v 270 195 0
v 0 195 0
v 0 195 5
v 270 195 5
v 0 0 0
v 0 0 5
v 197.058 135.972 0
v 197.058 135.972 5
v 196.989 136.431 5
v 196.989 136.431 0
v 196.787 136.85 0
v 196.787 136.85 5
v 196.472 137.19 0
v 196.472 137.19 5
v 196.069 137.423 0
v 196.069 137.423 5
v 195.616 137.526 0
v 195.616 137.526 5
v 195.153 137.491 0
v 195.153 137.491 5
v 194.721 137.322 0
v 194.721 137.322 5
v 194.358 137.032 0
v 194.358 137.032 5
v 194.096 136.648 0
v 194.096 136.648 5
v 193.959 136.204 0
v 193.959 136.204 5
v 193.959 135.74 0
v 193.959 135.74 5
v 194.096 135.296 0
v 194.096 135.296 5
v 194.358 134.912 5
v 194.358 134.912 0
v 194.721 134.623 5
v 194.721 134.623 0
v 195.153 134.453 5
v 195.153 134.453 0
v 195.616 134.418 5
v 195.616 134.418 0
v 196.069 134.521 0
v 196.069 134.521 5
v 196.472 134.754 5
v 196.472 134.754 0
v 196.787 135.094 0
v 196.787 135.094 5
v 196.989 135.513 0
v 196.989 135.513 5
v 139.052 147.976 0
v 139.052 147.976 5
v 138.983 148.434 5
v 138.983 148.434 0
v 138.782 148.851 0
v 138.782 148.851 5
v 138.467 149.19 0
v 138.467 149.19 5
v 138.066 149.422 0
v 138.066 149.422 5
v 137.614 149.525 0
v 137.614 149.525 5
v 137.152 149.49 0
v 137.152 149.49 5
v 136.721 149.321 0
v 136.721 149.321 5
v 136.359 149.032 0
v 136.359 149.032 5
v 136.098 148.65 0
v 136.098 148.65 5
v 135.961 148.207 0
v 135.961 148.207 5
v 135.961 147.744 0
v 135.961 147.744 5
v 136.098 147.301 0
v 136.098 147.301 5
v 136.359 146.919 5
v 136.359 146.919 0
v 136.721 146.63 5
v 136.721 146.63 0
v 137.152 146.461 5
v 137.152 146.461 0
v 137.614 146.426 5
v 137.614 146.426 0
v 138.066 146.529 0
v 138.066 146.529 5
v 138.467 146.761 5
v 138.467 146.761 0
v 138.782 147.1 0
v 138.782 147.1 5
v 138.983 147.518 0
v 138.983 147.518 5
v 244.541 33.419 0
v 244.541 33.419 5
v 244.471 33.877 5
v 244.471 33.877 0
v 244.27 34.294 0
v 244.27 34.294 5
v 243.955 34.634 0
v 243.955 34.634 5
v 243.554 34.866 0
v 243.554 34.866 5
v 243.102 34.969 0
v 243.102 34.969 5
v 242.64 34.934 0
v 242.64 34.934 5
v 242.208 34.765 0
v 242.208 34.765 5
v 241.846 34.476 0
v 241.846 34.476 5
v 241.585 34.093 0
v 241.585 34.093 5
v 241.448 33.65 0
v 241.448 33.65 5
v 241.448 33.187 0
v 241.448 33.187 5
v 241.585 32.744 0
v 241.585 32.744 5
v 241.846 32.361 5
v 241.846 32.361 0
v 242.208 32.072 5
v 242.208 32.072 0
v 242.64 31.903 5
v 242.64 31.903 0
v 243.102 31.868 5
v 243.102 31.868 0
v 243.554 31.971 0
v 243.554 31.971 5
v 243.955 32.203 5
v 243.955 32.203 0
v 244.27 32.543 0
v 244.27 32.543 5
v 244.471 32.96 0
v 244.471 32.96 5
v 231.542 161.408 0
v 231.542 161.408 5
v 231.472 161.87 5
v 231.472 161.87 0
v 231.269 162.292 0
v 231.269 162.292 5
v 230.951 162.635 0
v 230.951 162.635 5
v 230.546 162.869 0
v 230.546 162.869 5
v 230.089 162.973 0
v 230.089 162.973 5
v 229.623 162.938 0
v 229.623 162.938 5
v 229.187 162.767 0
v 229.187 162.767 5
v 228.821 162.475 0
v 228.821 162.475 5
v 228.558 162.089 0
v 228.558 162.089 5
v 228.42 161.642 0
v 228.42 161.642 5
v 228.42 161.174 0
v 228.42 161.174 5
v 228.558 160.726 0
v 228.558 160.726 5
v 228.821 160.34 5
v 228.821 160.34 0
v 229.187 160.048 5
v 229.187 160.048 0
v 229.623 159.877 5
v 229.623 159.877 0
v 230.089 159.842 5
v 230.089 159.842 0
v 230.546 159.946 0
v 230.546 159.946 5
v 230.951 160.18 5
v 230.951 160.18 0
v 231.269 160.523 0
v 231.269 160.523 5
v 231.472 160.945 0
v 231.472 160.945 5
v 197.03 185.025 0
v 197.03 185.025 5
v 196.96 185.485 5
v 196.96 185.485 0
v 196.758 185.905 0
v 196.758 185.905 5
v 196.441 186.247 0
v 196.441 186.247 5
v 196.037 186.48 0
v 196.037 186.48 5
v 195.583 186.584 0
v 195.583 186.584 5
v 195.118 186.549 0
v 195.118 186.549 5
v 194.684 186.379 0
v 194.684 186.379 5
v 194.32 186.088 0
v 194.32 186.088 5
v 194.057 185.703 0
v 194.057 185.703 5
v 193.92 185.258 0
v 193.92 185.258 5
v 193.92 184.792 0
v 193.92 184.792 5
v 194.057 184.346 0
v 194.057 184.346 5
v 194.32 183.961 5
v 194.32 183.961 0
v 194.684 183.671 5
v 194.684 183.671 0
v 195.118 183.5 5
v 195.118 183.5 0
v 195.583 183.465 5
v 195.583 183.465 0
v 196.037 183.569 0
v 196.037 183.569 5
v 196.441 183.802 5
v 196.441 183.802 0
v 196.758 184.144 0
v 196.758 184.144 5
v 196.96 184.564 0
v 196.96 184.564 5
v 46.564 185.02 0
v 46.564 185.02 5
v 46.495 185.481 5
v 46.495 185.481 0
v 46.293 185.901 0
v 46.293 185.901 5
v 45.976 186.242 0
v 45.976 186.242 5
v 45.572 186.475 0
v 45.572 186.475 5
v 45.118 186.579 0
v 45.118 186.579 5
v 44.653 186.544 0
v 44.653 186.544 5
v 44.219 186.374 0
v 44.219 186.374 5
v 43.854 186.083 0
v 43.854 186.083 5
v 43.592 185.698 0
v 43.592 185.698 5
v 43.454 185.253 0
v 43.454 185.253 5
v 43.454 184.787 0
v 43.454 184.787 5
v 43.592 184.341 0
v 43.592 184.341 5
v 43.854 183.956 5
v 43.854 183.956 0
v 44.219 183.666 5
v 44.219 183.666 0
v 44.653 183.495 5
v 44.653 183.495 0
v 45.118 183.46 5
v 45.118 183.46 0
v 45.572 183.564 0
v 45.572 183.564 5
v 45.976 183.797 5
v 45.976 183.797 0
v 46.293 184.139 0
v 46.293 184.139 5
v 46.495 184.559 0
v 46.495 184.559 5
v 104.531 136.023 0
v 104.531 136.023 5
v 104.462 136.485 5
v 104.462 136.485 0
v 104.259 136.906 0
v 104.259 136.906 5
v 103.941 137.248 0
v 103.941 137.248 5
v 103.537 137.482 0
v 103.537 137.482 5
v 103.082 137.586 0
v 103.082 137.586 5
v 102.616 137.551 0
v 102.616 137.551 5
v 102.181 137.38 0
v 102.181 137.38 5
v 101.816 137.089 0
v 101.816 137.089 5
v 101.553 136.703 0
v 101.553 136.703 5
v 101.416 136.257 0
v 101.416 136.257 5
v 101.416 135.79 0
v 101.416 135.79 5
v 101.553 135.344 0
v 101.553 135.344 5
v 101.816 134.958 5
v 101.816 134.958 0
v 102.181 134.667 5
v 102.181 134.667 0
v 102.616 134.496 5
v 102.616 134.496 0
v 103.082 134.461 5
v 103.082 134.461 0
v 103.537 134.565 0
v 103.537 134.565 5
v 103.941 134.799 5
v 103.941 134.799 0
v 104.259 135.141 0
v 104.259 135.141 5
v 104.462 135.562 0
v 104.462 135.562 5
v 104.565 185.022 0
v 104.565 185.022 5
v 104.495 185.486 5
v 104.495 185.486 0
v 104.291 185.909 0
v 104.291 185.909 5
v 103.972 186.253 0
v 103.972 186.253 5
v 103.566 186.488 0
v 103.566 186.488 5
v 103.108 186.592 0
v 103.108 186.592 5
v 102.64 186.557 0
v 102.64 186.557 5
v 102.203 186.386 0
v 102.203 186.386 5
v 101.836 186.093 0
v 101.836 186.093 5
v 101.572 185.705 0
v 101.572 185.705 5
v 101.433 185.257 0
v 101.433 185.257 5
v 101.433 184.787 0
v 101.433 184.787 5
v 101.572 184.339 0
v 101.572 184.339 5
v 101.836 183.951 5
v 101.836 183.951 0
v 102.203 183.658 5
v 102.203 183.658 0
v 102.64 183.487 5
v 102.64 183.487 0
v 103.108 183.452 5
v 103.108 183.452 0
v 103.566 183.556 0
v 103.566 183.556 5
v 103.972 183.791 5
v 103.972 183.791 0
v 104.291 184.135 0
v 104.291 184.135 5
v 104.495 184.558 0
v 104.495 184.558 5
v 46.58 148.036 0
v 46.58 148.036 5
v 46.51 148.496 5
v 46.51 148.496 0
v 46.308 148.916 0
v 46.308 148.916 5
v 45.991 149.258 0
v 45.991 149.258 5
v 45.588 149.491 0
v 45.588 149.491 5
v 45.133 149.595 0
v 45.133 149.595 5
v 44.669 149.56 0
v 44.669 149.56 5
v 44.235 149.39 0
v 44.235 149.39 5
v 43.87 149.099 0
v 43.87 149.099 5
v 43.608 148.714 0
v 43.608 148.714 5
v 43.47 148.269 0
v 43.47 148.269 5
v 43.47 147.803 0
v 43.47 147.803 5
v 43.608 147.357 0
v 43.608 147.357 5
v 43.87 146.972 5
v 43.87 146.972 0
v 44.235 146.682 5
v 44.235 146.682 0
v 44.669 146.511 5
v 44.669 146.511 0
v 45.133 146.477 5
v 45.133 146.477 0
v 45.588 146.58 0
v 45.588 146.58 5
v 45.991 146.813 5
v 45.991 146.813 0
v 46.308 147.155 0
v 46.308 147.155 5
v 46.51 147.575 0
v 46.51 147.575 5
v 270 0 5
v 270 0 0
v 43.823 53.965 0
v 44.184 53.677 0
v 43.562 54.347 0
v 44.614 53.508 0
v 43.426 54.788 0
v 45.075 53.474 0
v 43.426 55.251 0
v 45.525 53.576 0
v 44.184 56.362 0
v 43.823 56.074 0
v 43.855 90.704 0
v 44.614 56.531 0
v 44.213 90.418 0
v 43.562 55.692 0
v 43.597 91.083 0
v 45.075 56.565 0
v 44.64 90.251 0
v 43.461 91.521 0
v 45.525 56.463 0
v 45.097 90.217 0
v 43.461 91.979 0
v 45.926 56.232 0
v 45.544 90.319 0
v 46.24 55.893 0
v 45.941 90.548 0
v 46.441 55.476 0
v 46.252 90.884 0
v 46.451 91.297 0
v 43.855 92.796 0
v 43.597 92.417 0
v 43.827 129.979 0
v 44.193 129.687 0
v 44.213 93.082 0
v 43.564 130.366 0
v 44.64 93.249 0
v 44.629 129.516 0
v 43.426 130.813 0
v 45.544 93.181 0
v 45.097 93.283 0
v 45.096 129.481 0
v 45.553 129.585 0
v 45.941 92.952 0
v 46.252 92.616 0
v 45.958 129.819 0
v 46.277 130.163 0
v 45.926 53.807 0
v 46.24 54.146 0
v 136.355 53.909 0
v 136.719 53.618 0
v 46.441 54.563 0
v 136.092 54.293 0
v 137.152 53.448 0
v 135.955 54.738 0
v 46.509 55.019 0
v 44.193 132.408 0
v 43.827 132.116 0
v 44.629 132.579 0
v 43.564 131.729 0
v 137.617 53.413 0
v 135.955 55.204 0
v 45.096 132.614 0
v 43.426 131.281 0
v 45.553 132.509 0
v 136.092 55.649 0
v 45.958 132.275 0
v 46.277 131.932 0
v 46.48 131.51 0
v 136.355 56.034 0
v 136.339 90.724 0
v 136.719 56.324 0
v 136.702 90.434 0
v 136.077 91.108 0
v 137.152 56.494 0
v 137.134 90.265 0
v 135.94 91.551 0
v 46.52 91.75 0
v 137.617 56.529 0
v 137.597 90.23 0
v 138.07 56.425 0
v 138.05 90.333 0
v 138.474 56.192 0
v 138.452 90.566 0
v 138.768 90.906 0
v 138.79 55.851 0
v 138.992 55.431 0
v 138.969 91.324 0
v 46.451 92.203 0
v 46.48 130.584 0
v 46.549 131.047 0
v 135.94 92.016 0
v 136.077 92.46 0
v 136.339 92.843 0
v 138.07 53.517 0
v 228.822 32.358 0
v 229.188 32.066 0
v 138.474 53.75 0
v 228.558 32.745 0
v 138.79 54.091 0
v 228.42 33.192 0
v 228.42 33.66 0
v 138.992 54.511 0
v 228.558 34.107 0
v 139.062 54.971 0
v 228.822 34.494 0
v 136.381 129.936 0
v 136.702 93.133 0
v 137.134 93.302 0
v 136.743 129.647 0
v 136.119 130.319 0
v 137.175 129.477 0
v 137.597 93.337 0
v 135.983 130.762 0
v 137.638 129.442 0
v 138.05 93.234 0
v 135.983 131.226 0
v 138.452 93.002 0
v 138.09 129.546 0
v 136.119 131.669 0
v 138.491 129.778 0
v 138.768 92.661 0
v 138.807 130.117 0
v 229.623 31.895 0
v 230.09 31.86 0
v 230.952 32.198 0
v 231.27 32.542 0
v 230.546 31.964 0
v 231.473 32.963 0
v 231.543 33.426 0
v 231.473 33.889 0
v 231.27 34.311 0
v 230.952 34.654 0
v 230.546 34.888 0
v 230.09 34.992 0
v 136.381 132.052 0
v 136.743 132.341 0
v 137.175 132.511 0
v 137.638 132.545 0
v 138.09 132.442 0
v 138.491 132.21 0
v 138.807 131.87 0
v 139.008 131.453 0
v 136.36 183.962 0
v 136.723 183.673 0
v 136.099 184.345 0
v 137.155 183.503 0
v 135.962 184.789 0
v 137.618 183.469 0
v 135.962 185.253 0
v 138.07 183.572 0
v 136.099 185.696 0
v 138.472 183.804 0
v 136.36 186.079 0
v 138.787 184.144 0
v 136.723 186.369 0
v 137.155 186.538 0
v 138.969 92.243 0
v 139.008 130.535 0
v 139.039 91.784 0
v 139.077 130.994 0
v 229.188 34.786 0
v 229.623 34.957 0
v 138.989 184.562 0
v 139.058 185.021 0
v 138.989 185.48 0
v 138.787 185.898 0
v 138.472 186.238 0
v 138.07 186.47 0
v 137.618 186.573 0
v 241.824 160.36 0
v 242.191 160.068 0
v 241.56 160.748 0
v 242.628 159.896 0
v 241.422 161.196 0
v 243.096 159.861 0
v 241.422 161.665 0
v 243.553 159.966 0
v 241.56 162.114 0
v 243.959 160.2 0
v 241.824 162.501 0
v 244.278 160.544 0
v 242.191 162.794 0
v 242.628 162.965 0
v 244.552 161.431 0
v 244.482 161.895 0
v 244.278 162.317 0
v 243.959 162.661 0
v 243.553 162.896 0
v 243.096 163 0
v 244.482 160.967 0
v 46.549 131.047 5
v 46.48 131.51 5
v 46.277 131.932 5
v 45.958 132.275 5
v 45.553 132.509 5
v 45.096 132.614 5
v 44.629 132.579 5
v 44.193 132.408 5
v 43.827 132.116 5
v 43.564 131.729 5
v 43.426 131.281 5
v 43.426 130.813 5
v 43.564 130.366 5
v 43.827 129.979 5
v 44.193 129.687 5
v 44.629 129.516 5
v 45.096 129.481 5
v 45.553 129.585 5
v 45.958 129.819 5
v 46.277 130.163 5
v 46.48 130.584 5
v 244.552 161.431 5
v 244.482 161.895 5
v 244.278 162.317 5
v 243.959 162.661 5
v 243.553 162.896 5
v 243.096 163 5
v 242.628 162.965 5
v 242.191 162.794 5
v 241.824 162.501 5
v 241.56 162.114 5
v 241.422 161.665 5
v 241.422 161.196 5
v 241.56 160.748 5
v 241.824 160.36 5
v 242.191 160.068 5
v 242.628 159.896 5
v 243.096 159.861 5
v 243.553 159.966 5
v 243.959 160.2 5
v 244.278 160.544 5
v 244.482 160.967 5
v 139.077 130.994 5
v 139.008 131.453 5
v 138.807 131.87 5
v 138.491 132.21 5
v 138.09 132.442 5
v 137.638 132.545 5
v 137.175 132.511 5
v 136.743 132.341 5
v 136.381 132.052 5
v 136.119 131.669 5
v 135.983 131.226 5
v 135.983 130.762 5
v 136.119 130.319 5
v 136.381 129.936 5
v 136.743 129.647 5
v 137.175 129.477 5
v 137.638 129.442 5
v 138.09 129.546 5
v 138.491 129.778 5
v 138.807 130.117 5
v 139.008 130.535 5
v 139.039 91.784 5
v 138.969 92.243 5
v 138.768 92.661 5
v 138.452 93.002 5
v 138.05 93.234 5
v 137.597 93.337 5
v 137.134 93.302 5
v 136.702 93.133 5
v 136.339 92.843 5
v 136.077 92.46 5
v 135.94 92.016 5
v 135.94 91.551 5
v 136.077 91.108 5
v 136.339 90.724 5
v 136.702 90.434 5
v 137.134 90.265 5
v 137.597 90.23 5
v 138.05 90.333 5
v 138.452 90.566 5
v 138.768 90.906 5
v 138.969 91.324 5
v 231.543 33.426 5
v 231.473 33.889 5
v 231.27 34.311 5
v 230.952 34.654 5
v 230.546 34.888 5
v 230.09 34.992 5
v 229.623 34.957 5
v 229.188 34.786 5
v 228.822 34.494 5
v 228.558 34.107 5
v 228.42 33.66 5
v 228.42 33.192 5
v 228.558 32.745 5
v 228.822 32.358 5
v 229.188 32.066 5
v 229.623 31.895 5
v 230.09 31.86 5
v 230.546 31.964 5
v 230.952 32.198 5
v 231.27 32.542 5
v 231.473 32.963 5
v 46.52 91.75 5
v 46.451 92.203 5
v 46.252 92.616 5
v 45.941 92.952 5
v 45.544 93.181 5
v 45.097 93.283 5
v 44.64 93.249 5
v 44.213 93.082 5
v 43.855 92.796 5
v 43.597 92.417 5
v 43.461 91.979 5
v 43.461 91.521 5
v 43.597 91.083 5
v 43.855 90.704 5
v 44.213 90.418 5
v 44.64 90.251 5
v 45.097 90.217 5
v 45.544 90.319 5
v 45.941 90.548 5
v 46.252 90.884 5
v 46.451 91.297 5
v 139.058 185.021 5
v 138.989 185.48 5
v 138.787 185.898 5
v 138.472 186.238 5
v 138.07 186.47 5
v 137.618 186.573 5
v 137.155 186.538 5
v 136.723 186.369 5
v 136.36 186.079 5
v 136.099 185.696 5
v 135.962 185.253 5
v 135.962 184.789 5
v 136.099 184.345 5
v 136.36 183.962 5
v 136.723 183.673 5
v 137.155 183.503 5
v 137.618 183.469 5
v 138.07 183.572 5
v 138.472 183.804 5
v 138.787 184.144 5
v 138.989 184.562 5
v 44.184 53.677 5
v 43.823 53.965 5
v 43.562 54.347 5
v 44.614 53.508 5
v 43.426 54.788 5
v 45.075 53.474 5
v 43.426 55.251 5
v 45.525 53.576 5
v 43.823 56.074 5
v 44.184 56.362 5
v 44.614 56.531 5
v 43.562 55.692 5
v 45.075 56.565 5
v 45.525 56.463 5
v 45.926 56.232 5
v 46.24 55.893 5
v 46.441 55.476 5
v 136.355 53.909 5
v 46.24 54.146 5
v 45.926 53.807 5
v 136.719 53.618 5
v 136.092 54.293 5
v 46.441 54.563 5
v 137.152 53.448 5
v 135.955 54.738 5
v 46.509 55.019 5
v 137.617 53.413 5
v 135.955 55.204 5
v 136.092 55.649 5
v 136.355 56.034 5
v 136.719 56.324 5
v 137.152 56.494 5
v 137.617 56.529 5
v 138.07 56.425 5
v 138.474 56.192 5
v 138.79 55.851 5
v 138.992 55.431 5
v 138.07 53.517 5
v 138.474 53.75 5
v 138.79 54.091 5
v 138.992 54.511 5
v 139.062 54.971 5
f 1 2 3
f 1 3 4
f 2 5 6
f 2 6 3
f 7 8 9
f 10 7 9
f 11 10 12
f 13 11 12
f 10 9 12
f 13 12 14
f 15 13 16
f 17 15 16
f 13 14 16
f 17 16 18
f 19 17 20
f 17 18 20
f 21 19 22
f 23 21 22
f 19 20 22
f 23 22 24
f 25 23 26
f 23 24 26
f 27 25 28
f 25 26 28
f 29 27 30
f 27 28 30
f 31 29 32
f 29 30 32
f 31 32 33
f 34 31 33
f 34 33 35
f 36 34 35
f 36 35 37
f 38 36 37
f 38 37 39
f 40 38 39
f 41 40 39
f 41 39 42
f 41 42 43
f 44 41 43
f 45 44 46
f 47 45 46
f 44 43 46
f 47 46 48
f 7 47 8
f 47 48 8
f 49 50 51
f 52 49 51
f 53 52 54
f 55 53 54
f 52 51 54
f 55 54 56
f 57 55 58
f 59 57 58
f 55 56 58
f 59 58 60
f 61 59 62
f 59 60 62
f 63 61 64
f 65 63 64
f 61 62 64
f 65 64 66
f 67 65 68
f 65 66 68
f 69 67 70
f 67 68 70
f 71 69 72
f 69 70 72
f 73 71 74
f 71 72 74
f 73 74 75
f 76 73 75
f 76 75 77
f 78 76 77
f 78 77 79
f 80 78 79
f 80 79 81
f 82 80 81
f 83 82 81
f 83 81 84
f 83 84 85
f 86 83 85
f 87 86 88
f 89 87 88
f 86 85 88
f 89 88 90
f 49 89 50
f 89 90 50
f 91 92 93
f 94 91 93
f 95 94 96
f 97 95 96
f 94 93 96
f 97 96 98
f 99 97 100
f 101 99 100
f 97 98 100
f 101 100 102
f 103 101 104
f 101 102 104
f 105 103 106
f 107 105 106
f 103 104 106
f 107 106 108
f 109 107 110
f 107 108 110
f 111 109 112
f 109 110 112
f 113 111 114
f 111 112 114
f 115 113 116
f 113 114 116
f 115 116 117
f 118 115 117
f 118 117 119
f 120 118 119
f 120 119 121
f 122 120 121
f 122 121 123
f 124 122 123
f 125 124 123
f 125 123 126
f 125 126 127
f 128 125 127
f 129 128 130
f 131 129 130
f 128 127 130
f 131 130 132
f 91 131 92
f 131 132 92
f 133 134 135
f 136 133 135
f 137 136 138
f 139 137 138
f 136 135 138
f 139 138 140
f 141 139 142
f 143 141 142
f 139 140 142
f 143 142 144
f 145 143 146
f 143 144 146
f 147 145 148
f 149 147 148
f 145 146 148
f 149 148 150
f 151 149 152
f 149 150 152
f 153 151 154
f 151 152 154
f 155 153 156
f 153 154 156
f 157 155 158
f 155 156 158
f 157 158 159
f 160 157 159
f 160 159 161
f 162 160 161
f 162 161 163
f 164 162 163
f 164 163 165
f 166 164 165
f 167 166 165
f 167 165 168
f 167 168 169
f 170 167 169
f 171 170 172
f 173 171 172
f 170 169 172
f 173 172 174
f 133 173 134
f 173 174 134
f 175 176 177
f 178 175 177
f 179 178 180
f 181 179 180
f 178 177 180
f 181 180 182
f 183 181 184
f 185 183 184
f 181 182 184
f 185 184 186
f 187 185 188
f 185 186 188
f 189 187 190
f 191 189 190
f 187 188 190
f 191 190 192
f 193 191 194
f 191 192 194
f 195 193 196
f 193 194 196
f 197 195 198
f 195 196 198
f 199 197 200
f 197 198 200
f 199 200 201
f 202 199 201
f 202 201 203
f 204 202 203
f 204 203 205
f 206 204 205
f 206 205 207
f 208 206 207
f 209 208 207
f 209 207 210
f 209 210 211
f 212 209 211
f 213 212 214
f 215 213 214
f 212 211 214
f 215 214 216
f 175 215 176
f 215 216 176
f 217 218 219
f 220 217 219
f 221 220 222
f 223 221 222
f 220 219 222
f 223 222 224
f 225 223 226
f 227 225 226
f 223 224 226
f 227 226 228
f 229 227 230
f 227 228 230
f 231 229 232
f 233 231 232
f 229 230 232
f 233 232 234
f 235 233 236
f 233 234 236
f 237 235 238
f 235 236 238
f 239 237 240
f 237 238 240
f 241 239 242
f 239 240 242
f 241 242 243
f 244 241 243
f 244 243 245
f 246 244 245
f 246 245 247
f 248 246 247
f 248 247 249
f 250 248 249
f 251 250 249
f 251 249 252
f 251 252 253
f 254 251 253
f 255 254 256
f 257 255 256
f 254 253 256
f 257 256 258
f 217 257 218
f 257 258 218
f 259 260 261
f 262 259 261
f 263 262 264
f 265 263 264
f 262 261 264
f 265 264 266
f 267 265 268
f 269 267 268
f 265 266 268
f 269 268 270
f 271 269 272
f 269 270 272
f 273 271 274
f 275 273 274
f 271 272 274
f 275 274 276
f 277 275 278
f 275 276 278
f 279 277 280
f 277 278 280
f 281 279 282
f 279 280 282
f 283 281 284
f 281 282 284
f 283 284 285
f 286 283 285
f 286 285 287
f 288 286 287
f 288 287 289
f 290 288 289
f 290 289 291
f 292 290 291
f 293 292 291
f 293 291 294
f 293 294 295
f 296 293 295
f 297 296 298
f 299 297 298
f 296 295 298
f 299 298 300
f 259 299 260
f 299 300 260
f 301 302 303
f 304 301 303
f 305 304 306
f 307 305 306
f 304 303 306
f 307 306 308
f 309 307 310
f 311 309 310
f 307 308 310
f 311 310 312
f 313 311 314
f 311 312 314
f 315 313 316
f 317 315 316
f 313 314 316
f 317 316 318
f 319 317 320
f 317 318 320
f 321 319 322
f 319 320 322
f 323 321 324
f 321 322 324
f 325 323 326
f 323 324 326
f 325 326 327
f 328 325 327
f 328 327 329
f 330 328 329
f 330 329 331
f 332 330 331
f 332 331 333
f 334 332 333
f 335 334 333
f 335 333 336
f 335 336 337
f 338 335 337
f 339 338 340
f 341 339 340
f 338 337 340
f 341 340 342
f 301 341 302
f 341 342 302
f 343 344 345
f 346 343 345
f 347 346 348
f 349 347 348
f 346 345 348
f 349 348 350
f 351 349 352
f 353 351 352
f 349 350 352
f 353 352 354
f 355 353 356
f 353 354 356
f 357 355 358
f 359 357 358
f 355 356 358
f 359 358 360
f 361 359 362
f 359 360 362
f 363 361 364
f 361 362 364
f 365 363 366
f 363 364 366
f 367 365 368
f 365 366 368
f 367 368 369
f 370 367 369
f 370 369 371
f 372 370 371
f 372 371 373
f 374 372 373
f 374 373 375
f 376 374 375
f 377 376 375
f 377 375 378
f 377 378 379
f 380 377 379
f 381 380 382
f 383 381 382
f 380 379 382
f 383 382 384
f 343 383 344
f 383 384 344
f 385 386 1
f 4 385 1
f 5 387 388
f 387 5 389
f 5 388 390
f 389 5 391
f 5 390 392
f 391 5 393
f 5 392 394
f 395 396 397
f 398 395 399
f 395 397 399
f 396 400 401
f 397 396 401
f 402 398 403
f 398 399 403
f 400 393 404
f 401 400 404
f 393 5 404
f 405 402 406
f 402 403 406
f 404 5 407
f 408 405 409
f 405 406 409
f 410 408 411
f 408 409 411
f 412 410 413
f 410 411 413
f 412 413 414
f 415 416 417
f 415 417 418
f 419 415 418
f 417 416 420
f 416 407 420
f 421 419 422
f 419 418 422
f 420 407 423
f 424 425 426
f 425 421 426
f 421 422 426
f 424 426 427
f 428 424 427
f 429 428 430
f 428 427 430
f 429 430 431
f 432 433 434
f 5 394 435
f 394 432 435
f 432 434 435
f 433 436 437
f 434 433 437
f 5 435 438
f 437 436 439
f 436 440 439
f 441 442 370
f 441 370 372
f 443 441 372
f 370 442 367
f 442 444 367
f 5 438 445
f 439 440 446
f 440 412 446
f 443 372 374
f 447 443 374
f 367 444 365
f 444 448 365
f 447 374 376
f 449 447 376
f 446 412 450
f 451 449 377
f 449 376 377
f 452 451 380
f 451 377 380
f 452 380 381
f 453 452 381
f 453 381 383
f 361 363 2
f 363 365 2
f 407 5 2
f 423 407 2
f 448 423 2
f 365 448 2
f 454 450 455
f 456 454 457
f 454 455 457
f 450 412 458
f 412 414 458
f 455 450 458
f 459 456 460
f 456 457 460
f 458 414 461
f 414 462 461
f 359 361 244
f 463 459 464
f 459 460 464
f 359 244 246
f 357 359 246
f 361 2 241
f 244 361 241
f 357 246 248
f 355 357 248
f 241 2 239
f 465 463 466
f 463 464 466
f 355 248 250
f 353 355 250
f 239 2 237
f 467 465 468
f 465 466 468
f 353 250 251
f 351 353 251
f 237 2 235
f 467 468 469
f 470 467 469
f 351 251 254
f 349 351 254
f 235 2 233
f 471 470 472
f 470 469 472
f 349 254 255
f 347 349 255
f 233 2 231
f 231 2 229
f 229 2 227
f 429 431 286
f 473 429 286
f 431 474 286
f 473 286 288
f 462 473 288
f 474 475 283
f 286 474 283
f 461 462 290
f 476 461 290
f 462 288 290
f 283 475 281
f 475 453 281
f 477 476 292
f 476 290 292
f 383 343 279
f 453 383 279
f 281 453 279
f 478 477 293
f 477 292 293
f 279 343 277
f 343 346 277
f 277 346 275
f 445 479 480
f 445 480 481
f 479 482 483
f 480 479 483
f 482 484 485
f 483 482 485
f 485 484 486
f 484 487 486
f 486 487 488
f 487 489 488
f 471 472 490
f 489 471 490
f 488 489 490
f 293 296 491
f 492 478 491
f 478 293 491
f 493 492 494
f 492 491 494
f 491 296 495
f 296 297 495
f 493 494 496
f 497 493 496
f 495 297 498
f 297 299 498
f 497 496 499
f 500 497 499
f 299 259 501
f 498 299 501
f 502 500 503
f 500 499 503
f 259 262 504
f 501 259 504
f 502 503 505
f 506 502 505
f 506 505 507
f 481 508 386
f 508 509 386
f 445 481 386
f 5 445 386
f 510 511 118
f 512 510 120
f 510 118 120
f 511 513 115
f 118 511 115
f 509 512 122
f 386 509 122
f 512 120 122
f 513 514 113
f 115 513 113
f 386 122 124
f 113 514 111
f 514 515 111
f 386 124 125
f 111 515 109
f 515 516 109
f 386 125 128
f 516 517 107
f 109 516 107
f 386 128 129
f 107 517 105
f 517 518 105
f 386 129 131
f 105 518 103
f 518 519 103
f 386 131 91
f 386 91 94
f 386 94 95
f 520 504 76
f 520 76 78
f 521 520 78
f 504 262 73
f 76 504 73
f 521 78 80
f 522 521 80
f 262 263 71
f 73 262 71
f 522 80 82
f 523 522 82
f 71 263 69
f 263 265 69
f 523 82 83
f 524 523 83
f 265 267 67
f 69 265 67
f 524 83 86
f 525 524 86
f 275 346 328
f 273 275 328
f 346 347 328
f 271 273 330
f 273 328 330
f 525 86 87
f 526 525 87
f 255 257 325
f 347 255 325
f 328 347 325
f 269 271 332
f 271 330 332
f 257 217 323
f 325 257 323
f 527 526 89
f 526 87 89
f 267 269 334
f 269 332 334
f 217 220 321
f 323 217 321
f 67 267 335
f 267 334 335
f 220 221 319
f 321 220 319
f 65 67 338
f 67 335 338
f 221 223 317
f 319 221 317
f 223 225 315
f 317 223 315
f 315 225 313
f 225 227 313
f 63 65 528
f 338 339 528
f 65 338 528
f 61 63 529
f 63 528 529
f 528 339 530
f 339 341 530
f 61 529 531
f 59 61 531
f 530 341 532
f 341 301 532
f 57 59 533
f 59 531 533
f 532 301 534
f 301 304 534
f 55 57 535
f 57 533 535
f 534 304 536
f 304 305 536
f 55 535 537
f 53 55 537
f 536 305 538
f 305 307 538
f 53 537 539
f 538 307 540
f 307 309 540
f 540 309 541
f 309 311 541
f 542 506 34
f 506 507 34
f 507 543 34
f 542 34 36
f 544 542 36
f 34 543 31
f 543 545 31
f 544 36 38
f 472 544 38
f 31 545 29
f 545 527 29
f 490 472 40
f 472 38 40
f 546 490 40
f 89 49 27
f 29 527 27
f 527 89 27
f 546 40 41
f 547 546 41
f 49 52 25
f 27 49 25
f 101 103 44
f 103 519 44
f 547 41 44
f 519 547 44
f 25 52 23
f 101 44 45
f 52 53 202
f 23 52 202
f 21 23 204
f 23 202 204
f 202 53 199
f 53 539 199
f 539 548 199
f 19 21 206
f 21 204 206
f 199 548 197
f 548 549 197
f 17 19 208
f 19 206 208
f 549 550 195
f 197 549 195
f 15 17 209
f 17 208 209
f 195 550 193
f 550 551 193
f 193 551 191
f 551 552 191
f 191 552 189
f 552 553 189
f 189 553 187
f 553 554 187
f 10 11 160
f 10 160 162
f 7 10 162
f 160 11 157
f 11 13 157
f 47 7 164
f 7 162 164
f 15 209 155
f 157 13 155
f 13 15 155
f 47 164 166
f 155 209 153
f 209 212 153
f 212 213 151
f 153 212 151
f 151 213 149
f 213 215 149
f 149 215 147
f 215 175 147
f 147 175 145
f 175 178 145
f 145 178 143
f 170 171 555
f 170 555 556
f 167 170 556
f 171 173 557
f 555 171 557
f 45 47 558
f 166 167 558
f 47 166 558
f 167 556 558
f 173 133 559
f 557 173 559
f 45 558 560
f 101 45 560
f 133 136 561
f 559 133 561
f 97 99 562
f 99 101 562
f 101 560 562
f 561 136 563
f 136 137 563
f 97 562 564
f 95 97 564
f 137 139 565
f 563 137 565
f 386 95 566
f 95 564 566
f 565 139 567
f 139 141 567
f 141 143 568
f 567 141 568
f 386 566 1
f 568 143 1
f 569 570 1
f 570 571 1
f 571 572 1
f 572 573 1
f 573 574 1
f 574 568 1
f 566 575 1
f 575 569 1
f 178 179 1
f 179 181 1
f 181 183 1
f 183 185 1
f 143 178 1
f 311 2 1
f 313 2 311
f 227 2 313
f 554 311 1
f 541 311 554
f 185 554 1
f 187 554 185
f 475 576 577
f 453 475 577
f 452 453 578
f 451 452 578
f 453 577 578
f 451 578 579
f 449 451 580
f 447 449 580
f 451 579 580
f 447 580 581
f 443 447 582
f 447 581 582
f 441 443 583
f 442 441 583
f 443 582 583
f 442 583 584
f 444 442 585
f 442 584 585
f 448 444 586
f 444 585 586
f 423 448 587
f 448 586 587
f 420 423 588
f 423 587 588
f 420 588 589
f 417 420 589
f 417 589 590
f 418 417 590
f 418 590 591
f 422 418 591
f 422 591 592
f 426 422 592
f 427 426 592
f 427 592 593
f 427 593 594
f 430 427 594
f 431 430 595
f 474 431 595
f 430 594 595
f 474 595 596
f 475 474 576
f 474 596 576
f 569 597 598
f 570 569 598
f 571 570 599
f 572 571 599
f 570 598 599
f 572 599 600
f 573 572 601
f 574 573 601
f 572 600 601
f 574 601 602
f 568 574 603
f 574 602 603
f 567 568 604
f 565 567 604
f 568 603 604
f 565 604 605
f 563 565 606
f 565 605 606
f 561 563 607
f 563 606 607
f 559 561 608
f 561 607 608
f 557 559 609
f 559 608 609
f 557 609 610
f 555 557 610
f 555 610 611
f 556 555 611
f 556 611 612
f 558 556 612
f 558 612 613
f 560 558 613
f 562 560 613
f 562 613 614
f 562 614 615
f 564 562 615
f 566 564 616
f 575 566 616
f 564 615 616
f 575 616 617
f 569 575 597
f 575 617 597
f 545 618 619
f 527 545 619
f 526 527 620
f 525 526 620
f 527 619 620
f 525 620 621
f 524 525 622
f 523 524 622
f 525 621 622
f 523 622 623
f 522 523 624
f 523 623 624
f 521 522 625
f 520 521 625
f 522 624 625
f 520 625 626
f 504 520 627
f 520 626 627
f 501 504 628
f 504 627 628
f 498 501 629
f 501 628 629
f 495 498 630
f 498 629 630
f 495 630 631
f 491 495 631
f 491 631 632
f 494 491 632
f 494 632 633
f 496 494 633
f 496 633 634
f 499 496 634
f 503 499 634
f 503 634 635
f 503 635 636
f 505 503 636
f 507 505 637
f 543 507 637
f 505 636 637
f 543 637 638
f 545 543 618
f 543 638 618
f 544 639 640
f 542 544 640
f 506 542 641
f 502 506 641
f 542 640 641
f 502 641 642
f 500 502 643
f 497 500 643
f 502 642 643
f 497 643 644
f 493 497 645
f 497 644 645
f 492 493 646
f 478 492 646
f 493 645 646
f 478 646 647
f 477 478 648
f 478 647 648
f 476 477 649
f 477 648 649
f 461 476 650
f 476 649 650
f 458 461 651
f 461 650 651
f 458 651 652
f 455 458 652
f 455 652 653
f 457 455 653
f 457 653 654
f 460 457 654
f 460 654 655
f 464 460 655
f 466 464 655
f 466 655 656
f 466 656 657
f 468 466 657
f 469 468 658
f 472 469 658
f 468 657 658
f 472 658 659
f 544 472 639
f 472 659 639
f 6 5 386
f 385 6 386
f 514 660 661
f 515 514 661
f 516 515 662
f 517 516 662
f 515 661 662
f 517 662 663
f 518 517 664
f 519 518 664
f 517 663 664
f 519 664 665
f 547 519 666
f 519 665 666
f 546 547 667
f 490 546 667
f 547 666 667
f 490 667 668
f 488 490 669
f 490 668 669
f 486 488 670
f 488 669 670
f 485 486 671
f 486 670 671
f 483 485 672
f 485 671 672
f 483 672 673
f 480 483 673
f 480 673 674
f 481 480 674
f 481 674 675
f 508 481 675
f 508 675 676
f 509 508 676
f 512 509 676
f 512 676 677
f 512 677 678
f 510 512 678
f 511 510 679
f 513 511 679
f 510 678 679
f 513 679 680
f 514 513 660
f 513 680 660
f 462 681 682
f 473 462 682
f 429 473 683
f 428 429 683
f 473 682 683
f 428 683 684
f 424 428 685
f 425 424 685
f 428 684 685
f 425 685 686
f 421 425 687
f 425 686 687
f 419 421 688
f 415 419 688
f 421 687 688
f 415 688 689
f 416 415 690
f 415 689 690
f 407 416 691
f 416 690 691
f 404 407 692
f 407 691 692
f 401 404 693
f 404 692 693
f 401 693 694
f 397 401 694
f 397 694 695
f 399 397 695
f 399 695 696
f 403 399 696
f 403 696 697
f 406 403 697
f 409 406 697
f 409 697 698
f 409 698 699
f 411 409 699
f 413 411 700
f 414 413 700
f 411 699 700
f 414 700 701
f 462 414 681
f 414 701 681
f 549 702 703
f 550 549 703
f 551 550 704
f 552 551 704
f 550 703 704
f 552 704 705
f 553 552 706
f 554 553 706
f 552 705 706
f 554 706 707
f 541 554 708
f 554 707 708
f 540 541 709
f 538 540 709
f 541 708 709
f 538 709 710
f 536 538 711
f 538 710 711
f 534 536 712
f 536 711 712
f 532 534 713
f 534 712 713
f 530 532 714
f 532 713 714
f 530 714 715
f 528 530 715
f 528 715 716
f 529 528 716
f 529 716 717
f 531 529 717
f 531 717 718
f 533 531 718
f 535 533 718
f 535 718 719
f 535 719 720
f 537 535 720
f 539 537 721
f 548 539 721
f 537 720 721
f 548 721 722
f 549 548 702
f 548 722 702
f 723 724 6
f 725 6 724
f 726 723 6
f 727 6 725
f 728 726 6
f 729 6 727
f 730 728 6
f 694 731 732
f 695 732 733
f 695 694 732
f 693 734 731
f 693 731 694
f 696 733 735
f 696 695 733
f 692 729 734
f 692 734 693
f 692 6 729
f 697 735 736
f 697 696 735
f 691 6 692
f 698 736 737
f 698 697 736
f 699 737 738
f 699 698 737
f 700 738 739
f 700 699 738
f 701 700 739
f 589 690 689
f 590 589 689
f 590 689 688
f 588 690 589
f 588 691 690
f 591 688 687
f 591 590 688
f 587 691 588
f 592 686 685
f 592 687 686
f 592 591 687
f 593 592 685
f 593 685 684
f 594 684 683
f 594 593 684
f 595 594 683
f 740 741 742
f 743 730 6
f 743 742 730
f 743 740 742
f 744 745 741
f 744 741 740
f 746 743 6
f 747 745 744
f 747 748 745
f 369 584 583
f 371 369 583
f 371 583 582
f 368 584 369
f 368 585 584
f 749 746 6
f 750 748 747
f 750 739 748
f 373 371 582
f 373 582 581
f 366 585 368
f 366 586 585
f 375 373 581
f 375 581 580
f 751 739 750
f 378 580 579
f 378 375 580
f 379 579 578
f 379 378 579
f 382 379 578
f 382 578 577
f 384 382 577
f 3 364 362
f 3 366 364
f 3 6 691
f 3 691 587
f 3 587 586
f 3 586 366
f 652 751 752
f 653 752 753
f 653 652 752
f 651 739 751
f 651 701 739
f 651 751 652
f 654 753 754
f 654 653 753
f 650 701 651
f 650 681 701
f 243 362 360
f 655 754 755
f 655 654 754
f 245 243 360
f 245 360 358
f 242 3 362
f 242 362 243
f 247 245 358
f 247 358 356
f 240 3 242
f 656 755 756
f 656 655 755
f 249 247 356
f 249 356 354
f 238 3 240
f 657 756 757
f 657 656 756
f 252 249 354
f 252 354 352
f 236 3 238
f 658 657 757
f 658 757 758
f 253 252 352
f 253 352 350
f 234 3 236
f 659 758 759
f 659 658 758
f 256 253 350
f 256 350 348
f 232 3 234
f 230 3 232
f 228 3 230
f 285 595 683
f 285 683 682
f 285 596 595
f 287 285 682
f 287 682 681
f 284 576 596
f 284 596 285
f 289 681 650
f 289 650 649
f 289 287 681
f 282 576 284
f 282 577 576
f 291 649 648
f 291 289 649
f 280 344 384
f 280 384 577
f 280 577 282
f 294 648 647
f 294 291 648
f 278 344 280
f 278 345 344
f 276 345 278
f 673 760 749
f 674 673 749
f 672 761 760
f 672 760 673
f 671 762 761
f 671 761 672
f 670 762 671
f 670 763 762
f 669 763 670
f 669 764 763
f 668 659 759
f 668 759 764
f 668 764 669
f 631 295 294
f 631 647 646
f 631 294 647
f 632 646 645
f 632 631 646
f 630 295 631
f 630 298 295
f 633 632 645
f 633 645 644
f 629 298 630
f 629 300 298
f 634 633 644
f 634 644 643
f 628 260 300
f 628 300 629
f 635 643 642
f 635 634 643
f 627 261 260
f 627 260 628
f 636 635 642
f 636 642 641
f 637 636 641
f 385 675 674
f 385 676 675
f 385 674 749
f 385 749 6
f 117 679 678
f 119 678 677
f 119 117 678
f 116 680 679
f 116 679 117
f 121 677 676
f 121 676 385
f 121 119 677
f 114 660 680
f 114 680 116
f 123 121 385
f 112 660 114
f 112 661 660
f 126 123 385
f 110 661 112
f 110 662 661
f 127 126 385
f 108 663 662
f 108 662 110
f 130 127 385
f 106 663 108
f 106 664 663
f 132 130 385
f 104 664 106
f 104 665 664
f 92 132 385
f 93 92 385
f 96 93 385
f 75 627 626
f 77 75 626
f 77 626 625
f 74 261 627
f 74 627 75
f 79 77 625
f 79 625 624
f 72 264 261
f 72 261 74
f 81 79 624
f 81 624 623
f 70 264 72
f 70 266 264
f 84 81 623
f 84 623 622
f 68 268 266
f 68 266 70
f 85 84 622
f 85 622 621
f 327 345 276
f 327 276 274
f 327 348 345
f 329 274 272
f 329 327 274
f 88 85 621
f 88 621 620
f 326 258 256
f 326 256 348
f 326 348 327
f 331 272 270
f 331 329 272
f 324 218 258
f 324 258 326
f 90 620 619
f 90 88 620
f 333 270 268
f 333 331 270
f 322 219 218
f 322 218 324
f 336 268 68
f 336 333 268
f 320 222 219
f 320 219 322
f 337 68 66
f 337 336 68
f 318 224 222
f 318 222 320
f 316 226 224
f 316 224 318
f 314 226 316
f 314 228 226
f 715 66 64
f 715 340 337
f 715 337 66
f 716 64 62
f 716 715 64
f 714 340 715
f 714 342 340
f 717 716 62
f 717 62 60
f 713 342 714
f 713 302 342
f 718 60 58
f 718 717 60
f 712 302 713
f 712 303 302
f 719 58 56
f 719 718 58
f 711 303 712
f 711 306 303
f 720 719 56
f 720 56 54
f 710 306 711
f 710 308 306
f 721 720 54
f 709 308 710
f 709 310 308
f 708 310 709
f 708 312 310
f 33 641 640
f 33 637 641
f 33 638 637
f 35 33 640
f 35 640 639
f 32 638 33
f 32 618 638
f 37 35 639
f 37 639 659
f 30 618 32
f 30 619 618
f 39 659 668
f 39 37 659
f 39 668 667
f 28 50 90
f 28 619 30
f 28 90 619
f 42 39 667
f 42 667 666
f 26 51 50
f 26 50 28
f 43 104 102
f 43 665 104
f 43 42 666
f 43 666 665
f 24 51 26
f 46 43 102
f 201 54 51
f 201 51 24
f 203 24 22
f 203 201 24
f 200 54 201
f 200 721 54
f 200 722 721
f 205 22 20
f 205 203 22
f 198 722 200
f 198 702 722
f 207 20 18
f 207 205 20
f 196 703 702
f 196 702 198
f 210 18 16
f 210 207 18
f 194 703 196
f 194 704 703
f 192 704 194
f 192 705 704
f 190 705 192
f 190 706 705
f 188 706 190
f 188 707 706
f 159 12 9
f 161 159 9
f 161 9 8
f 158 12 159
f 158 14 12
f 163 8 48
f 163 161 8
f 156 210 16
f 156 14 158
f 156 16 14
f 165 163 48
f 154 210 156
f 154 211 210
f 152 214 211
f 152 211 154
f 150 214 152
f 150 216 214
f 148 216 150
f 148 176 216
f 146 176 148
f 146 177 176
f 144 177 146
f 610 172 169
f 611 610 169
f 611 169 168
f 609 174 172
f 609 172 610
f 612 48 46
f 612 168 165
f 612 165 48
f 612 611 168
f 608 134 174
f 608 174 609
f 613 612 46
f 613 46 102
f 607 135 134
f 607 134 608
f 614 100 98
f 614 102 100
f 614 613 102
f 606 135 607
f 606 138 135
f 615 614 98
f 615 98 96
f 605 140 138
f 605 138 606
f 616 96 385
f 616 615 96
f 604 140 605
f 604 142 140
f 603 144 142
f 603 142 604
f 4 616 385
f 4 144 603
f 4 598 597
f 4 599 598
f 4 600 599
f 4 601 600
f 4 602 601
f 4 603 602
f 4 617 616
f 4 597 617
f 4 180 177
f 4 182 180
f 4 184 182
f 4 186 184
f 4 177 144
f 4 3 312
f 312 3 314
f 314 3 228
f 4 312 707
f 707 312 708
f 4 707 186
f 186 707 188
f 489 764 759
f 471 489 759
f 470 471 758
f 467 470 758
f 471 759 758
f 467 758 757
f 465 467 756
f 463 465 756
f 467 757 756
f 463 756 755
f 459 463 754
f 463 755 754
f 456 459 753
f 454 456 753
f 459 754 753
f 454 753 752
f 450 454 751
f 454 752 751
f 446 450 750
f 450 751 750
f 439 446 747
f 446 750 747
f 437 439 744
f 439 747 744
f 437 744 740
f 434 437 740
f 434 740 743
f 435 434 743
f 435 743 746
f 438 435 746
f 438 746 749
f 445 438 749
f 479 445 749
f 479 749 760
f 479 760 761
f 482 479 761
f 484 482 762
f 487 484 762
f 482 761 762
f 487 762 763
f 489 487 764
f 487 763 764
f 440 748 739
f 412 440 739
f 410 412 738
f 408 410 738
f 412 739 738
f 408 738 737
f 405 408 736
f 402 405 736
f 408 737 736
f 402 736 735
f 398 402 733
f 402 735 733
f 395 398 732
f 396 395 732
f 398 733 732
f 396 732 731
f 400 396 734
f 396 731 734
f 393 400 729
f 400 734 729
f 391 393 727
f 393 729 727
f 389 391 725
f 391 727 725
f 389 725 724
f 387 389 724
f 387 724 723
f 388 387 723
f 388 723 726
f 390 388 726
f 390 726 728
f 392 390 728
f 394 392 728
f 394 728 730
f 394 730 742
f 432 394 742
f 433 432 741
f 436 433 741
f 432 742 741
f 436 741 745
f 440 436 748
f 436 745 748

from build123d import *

# Parameters (mm, degrees)
BOX002_W        = 270
BOX002_H        = 195
BOX002_DEPTH    = 5
SKETCH032_R     = 1.563701
SKETCH032_R_2   = 1.563456
SKETCH032_R_3   = 1.570642
SKETCH032_R_4   = 1.574697
SKETCH032_R_5   = 1.556572
SKETCH032_R_6   = 1.566638
SKETCH032_R_7   = 1.563531
SKETCH032_R_8   = 1.553764
SKETCH032_R_9   = 1.555861
SKETCH032_R_10  = 1.537616
SKETCH032_R_11  = 1.557895
SKETCH032_R_12  = 1.550283
SKETCH032_R_13  = 1.562096
SKETCH032_R_14  = 1.558297
SKETCH032_R_15  = 1.569992
SKETCH032_R_16  = 1.573874
SKETCH032_R_17  = 1.570268
SKETCH032_R_18  = 1.554723
POCKET002_DEPTH = 5


with BuildPart() as part:
    # Box002 → Box002 (new body)
    with BuildSketch(Plane.XY):
        with Locations((135, 97.5)):
            Rectangle(BOX002_W, BOX002_H)
    extrude(amount=BOX002_DEPTH)

    # Sketch032 → Pocket002 (cut)
    with BuildSketch(Plane.XY.offset(5)):
        with Locations((45.000683, 185.019791)):
            Circle(SKETCH032_R)
        with Locations((45.016438, 148.035629)):
            Circle(SKETCH032_R_2)
        with Locations((44.978775, 131.047394)):
            Circle(SKETCH032_R_3)
        with Locations((102.990273, 185.022049)):
            Circle(SKETCH032_R_4)
        with Locations((137.501236, 185.020721)):
            Circle(SKETCH032_R_5)
        with Locations((102.964661, 136.023376)):
            Circle(SKETCH032_R_6)
        with Locations((195.46611, 185.024612)):
            Circle(SKETCH032_R_7)
        with Locations((137.497864, 147.975647)):
            Circle(SKETCH032_R_8)
        with Locations((137.52124, 130.993927)):
            Circle(SKETCH032_R_9)
        with Locations((44.981915, 91.750061)):
            Circle(SKETCH032_R_10)
        with Locations((137.480698, 91.7836)):
            Circle(SKETCH032_R_11)
        with Locations((44.959114, 55.019478)):
            Circle(SKETCH032_R_12)
        with Locations((137.499786, 54.971008)):
            Circle(SKETCH032_R_13)
        with Locations((195.499939, 135.972031)):
            Circle(SKETCH032_R_14)
        with Locations((229.972061, 161.407578)):
            Circle(SKETCH032_R_15)
        with Locations((242.978088, 161.430893)):
            Circle(SKETCH032_R_16)
        with Locations((229.972733, 33.426083)):
            Circle(SKETCH032_R_17)
        with Locations((242.98584, 33.418591)):
            Circle(SKETCH032_R_18)
    extrude(amount=-POCKET002_DEPTH, mode=Mode.SUBTRACT)


solid = part.part
